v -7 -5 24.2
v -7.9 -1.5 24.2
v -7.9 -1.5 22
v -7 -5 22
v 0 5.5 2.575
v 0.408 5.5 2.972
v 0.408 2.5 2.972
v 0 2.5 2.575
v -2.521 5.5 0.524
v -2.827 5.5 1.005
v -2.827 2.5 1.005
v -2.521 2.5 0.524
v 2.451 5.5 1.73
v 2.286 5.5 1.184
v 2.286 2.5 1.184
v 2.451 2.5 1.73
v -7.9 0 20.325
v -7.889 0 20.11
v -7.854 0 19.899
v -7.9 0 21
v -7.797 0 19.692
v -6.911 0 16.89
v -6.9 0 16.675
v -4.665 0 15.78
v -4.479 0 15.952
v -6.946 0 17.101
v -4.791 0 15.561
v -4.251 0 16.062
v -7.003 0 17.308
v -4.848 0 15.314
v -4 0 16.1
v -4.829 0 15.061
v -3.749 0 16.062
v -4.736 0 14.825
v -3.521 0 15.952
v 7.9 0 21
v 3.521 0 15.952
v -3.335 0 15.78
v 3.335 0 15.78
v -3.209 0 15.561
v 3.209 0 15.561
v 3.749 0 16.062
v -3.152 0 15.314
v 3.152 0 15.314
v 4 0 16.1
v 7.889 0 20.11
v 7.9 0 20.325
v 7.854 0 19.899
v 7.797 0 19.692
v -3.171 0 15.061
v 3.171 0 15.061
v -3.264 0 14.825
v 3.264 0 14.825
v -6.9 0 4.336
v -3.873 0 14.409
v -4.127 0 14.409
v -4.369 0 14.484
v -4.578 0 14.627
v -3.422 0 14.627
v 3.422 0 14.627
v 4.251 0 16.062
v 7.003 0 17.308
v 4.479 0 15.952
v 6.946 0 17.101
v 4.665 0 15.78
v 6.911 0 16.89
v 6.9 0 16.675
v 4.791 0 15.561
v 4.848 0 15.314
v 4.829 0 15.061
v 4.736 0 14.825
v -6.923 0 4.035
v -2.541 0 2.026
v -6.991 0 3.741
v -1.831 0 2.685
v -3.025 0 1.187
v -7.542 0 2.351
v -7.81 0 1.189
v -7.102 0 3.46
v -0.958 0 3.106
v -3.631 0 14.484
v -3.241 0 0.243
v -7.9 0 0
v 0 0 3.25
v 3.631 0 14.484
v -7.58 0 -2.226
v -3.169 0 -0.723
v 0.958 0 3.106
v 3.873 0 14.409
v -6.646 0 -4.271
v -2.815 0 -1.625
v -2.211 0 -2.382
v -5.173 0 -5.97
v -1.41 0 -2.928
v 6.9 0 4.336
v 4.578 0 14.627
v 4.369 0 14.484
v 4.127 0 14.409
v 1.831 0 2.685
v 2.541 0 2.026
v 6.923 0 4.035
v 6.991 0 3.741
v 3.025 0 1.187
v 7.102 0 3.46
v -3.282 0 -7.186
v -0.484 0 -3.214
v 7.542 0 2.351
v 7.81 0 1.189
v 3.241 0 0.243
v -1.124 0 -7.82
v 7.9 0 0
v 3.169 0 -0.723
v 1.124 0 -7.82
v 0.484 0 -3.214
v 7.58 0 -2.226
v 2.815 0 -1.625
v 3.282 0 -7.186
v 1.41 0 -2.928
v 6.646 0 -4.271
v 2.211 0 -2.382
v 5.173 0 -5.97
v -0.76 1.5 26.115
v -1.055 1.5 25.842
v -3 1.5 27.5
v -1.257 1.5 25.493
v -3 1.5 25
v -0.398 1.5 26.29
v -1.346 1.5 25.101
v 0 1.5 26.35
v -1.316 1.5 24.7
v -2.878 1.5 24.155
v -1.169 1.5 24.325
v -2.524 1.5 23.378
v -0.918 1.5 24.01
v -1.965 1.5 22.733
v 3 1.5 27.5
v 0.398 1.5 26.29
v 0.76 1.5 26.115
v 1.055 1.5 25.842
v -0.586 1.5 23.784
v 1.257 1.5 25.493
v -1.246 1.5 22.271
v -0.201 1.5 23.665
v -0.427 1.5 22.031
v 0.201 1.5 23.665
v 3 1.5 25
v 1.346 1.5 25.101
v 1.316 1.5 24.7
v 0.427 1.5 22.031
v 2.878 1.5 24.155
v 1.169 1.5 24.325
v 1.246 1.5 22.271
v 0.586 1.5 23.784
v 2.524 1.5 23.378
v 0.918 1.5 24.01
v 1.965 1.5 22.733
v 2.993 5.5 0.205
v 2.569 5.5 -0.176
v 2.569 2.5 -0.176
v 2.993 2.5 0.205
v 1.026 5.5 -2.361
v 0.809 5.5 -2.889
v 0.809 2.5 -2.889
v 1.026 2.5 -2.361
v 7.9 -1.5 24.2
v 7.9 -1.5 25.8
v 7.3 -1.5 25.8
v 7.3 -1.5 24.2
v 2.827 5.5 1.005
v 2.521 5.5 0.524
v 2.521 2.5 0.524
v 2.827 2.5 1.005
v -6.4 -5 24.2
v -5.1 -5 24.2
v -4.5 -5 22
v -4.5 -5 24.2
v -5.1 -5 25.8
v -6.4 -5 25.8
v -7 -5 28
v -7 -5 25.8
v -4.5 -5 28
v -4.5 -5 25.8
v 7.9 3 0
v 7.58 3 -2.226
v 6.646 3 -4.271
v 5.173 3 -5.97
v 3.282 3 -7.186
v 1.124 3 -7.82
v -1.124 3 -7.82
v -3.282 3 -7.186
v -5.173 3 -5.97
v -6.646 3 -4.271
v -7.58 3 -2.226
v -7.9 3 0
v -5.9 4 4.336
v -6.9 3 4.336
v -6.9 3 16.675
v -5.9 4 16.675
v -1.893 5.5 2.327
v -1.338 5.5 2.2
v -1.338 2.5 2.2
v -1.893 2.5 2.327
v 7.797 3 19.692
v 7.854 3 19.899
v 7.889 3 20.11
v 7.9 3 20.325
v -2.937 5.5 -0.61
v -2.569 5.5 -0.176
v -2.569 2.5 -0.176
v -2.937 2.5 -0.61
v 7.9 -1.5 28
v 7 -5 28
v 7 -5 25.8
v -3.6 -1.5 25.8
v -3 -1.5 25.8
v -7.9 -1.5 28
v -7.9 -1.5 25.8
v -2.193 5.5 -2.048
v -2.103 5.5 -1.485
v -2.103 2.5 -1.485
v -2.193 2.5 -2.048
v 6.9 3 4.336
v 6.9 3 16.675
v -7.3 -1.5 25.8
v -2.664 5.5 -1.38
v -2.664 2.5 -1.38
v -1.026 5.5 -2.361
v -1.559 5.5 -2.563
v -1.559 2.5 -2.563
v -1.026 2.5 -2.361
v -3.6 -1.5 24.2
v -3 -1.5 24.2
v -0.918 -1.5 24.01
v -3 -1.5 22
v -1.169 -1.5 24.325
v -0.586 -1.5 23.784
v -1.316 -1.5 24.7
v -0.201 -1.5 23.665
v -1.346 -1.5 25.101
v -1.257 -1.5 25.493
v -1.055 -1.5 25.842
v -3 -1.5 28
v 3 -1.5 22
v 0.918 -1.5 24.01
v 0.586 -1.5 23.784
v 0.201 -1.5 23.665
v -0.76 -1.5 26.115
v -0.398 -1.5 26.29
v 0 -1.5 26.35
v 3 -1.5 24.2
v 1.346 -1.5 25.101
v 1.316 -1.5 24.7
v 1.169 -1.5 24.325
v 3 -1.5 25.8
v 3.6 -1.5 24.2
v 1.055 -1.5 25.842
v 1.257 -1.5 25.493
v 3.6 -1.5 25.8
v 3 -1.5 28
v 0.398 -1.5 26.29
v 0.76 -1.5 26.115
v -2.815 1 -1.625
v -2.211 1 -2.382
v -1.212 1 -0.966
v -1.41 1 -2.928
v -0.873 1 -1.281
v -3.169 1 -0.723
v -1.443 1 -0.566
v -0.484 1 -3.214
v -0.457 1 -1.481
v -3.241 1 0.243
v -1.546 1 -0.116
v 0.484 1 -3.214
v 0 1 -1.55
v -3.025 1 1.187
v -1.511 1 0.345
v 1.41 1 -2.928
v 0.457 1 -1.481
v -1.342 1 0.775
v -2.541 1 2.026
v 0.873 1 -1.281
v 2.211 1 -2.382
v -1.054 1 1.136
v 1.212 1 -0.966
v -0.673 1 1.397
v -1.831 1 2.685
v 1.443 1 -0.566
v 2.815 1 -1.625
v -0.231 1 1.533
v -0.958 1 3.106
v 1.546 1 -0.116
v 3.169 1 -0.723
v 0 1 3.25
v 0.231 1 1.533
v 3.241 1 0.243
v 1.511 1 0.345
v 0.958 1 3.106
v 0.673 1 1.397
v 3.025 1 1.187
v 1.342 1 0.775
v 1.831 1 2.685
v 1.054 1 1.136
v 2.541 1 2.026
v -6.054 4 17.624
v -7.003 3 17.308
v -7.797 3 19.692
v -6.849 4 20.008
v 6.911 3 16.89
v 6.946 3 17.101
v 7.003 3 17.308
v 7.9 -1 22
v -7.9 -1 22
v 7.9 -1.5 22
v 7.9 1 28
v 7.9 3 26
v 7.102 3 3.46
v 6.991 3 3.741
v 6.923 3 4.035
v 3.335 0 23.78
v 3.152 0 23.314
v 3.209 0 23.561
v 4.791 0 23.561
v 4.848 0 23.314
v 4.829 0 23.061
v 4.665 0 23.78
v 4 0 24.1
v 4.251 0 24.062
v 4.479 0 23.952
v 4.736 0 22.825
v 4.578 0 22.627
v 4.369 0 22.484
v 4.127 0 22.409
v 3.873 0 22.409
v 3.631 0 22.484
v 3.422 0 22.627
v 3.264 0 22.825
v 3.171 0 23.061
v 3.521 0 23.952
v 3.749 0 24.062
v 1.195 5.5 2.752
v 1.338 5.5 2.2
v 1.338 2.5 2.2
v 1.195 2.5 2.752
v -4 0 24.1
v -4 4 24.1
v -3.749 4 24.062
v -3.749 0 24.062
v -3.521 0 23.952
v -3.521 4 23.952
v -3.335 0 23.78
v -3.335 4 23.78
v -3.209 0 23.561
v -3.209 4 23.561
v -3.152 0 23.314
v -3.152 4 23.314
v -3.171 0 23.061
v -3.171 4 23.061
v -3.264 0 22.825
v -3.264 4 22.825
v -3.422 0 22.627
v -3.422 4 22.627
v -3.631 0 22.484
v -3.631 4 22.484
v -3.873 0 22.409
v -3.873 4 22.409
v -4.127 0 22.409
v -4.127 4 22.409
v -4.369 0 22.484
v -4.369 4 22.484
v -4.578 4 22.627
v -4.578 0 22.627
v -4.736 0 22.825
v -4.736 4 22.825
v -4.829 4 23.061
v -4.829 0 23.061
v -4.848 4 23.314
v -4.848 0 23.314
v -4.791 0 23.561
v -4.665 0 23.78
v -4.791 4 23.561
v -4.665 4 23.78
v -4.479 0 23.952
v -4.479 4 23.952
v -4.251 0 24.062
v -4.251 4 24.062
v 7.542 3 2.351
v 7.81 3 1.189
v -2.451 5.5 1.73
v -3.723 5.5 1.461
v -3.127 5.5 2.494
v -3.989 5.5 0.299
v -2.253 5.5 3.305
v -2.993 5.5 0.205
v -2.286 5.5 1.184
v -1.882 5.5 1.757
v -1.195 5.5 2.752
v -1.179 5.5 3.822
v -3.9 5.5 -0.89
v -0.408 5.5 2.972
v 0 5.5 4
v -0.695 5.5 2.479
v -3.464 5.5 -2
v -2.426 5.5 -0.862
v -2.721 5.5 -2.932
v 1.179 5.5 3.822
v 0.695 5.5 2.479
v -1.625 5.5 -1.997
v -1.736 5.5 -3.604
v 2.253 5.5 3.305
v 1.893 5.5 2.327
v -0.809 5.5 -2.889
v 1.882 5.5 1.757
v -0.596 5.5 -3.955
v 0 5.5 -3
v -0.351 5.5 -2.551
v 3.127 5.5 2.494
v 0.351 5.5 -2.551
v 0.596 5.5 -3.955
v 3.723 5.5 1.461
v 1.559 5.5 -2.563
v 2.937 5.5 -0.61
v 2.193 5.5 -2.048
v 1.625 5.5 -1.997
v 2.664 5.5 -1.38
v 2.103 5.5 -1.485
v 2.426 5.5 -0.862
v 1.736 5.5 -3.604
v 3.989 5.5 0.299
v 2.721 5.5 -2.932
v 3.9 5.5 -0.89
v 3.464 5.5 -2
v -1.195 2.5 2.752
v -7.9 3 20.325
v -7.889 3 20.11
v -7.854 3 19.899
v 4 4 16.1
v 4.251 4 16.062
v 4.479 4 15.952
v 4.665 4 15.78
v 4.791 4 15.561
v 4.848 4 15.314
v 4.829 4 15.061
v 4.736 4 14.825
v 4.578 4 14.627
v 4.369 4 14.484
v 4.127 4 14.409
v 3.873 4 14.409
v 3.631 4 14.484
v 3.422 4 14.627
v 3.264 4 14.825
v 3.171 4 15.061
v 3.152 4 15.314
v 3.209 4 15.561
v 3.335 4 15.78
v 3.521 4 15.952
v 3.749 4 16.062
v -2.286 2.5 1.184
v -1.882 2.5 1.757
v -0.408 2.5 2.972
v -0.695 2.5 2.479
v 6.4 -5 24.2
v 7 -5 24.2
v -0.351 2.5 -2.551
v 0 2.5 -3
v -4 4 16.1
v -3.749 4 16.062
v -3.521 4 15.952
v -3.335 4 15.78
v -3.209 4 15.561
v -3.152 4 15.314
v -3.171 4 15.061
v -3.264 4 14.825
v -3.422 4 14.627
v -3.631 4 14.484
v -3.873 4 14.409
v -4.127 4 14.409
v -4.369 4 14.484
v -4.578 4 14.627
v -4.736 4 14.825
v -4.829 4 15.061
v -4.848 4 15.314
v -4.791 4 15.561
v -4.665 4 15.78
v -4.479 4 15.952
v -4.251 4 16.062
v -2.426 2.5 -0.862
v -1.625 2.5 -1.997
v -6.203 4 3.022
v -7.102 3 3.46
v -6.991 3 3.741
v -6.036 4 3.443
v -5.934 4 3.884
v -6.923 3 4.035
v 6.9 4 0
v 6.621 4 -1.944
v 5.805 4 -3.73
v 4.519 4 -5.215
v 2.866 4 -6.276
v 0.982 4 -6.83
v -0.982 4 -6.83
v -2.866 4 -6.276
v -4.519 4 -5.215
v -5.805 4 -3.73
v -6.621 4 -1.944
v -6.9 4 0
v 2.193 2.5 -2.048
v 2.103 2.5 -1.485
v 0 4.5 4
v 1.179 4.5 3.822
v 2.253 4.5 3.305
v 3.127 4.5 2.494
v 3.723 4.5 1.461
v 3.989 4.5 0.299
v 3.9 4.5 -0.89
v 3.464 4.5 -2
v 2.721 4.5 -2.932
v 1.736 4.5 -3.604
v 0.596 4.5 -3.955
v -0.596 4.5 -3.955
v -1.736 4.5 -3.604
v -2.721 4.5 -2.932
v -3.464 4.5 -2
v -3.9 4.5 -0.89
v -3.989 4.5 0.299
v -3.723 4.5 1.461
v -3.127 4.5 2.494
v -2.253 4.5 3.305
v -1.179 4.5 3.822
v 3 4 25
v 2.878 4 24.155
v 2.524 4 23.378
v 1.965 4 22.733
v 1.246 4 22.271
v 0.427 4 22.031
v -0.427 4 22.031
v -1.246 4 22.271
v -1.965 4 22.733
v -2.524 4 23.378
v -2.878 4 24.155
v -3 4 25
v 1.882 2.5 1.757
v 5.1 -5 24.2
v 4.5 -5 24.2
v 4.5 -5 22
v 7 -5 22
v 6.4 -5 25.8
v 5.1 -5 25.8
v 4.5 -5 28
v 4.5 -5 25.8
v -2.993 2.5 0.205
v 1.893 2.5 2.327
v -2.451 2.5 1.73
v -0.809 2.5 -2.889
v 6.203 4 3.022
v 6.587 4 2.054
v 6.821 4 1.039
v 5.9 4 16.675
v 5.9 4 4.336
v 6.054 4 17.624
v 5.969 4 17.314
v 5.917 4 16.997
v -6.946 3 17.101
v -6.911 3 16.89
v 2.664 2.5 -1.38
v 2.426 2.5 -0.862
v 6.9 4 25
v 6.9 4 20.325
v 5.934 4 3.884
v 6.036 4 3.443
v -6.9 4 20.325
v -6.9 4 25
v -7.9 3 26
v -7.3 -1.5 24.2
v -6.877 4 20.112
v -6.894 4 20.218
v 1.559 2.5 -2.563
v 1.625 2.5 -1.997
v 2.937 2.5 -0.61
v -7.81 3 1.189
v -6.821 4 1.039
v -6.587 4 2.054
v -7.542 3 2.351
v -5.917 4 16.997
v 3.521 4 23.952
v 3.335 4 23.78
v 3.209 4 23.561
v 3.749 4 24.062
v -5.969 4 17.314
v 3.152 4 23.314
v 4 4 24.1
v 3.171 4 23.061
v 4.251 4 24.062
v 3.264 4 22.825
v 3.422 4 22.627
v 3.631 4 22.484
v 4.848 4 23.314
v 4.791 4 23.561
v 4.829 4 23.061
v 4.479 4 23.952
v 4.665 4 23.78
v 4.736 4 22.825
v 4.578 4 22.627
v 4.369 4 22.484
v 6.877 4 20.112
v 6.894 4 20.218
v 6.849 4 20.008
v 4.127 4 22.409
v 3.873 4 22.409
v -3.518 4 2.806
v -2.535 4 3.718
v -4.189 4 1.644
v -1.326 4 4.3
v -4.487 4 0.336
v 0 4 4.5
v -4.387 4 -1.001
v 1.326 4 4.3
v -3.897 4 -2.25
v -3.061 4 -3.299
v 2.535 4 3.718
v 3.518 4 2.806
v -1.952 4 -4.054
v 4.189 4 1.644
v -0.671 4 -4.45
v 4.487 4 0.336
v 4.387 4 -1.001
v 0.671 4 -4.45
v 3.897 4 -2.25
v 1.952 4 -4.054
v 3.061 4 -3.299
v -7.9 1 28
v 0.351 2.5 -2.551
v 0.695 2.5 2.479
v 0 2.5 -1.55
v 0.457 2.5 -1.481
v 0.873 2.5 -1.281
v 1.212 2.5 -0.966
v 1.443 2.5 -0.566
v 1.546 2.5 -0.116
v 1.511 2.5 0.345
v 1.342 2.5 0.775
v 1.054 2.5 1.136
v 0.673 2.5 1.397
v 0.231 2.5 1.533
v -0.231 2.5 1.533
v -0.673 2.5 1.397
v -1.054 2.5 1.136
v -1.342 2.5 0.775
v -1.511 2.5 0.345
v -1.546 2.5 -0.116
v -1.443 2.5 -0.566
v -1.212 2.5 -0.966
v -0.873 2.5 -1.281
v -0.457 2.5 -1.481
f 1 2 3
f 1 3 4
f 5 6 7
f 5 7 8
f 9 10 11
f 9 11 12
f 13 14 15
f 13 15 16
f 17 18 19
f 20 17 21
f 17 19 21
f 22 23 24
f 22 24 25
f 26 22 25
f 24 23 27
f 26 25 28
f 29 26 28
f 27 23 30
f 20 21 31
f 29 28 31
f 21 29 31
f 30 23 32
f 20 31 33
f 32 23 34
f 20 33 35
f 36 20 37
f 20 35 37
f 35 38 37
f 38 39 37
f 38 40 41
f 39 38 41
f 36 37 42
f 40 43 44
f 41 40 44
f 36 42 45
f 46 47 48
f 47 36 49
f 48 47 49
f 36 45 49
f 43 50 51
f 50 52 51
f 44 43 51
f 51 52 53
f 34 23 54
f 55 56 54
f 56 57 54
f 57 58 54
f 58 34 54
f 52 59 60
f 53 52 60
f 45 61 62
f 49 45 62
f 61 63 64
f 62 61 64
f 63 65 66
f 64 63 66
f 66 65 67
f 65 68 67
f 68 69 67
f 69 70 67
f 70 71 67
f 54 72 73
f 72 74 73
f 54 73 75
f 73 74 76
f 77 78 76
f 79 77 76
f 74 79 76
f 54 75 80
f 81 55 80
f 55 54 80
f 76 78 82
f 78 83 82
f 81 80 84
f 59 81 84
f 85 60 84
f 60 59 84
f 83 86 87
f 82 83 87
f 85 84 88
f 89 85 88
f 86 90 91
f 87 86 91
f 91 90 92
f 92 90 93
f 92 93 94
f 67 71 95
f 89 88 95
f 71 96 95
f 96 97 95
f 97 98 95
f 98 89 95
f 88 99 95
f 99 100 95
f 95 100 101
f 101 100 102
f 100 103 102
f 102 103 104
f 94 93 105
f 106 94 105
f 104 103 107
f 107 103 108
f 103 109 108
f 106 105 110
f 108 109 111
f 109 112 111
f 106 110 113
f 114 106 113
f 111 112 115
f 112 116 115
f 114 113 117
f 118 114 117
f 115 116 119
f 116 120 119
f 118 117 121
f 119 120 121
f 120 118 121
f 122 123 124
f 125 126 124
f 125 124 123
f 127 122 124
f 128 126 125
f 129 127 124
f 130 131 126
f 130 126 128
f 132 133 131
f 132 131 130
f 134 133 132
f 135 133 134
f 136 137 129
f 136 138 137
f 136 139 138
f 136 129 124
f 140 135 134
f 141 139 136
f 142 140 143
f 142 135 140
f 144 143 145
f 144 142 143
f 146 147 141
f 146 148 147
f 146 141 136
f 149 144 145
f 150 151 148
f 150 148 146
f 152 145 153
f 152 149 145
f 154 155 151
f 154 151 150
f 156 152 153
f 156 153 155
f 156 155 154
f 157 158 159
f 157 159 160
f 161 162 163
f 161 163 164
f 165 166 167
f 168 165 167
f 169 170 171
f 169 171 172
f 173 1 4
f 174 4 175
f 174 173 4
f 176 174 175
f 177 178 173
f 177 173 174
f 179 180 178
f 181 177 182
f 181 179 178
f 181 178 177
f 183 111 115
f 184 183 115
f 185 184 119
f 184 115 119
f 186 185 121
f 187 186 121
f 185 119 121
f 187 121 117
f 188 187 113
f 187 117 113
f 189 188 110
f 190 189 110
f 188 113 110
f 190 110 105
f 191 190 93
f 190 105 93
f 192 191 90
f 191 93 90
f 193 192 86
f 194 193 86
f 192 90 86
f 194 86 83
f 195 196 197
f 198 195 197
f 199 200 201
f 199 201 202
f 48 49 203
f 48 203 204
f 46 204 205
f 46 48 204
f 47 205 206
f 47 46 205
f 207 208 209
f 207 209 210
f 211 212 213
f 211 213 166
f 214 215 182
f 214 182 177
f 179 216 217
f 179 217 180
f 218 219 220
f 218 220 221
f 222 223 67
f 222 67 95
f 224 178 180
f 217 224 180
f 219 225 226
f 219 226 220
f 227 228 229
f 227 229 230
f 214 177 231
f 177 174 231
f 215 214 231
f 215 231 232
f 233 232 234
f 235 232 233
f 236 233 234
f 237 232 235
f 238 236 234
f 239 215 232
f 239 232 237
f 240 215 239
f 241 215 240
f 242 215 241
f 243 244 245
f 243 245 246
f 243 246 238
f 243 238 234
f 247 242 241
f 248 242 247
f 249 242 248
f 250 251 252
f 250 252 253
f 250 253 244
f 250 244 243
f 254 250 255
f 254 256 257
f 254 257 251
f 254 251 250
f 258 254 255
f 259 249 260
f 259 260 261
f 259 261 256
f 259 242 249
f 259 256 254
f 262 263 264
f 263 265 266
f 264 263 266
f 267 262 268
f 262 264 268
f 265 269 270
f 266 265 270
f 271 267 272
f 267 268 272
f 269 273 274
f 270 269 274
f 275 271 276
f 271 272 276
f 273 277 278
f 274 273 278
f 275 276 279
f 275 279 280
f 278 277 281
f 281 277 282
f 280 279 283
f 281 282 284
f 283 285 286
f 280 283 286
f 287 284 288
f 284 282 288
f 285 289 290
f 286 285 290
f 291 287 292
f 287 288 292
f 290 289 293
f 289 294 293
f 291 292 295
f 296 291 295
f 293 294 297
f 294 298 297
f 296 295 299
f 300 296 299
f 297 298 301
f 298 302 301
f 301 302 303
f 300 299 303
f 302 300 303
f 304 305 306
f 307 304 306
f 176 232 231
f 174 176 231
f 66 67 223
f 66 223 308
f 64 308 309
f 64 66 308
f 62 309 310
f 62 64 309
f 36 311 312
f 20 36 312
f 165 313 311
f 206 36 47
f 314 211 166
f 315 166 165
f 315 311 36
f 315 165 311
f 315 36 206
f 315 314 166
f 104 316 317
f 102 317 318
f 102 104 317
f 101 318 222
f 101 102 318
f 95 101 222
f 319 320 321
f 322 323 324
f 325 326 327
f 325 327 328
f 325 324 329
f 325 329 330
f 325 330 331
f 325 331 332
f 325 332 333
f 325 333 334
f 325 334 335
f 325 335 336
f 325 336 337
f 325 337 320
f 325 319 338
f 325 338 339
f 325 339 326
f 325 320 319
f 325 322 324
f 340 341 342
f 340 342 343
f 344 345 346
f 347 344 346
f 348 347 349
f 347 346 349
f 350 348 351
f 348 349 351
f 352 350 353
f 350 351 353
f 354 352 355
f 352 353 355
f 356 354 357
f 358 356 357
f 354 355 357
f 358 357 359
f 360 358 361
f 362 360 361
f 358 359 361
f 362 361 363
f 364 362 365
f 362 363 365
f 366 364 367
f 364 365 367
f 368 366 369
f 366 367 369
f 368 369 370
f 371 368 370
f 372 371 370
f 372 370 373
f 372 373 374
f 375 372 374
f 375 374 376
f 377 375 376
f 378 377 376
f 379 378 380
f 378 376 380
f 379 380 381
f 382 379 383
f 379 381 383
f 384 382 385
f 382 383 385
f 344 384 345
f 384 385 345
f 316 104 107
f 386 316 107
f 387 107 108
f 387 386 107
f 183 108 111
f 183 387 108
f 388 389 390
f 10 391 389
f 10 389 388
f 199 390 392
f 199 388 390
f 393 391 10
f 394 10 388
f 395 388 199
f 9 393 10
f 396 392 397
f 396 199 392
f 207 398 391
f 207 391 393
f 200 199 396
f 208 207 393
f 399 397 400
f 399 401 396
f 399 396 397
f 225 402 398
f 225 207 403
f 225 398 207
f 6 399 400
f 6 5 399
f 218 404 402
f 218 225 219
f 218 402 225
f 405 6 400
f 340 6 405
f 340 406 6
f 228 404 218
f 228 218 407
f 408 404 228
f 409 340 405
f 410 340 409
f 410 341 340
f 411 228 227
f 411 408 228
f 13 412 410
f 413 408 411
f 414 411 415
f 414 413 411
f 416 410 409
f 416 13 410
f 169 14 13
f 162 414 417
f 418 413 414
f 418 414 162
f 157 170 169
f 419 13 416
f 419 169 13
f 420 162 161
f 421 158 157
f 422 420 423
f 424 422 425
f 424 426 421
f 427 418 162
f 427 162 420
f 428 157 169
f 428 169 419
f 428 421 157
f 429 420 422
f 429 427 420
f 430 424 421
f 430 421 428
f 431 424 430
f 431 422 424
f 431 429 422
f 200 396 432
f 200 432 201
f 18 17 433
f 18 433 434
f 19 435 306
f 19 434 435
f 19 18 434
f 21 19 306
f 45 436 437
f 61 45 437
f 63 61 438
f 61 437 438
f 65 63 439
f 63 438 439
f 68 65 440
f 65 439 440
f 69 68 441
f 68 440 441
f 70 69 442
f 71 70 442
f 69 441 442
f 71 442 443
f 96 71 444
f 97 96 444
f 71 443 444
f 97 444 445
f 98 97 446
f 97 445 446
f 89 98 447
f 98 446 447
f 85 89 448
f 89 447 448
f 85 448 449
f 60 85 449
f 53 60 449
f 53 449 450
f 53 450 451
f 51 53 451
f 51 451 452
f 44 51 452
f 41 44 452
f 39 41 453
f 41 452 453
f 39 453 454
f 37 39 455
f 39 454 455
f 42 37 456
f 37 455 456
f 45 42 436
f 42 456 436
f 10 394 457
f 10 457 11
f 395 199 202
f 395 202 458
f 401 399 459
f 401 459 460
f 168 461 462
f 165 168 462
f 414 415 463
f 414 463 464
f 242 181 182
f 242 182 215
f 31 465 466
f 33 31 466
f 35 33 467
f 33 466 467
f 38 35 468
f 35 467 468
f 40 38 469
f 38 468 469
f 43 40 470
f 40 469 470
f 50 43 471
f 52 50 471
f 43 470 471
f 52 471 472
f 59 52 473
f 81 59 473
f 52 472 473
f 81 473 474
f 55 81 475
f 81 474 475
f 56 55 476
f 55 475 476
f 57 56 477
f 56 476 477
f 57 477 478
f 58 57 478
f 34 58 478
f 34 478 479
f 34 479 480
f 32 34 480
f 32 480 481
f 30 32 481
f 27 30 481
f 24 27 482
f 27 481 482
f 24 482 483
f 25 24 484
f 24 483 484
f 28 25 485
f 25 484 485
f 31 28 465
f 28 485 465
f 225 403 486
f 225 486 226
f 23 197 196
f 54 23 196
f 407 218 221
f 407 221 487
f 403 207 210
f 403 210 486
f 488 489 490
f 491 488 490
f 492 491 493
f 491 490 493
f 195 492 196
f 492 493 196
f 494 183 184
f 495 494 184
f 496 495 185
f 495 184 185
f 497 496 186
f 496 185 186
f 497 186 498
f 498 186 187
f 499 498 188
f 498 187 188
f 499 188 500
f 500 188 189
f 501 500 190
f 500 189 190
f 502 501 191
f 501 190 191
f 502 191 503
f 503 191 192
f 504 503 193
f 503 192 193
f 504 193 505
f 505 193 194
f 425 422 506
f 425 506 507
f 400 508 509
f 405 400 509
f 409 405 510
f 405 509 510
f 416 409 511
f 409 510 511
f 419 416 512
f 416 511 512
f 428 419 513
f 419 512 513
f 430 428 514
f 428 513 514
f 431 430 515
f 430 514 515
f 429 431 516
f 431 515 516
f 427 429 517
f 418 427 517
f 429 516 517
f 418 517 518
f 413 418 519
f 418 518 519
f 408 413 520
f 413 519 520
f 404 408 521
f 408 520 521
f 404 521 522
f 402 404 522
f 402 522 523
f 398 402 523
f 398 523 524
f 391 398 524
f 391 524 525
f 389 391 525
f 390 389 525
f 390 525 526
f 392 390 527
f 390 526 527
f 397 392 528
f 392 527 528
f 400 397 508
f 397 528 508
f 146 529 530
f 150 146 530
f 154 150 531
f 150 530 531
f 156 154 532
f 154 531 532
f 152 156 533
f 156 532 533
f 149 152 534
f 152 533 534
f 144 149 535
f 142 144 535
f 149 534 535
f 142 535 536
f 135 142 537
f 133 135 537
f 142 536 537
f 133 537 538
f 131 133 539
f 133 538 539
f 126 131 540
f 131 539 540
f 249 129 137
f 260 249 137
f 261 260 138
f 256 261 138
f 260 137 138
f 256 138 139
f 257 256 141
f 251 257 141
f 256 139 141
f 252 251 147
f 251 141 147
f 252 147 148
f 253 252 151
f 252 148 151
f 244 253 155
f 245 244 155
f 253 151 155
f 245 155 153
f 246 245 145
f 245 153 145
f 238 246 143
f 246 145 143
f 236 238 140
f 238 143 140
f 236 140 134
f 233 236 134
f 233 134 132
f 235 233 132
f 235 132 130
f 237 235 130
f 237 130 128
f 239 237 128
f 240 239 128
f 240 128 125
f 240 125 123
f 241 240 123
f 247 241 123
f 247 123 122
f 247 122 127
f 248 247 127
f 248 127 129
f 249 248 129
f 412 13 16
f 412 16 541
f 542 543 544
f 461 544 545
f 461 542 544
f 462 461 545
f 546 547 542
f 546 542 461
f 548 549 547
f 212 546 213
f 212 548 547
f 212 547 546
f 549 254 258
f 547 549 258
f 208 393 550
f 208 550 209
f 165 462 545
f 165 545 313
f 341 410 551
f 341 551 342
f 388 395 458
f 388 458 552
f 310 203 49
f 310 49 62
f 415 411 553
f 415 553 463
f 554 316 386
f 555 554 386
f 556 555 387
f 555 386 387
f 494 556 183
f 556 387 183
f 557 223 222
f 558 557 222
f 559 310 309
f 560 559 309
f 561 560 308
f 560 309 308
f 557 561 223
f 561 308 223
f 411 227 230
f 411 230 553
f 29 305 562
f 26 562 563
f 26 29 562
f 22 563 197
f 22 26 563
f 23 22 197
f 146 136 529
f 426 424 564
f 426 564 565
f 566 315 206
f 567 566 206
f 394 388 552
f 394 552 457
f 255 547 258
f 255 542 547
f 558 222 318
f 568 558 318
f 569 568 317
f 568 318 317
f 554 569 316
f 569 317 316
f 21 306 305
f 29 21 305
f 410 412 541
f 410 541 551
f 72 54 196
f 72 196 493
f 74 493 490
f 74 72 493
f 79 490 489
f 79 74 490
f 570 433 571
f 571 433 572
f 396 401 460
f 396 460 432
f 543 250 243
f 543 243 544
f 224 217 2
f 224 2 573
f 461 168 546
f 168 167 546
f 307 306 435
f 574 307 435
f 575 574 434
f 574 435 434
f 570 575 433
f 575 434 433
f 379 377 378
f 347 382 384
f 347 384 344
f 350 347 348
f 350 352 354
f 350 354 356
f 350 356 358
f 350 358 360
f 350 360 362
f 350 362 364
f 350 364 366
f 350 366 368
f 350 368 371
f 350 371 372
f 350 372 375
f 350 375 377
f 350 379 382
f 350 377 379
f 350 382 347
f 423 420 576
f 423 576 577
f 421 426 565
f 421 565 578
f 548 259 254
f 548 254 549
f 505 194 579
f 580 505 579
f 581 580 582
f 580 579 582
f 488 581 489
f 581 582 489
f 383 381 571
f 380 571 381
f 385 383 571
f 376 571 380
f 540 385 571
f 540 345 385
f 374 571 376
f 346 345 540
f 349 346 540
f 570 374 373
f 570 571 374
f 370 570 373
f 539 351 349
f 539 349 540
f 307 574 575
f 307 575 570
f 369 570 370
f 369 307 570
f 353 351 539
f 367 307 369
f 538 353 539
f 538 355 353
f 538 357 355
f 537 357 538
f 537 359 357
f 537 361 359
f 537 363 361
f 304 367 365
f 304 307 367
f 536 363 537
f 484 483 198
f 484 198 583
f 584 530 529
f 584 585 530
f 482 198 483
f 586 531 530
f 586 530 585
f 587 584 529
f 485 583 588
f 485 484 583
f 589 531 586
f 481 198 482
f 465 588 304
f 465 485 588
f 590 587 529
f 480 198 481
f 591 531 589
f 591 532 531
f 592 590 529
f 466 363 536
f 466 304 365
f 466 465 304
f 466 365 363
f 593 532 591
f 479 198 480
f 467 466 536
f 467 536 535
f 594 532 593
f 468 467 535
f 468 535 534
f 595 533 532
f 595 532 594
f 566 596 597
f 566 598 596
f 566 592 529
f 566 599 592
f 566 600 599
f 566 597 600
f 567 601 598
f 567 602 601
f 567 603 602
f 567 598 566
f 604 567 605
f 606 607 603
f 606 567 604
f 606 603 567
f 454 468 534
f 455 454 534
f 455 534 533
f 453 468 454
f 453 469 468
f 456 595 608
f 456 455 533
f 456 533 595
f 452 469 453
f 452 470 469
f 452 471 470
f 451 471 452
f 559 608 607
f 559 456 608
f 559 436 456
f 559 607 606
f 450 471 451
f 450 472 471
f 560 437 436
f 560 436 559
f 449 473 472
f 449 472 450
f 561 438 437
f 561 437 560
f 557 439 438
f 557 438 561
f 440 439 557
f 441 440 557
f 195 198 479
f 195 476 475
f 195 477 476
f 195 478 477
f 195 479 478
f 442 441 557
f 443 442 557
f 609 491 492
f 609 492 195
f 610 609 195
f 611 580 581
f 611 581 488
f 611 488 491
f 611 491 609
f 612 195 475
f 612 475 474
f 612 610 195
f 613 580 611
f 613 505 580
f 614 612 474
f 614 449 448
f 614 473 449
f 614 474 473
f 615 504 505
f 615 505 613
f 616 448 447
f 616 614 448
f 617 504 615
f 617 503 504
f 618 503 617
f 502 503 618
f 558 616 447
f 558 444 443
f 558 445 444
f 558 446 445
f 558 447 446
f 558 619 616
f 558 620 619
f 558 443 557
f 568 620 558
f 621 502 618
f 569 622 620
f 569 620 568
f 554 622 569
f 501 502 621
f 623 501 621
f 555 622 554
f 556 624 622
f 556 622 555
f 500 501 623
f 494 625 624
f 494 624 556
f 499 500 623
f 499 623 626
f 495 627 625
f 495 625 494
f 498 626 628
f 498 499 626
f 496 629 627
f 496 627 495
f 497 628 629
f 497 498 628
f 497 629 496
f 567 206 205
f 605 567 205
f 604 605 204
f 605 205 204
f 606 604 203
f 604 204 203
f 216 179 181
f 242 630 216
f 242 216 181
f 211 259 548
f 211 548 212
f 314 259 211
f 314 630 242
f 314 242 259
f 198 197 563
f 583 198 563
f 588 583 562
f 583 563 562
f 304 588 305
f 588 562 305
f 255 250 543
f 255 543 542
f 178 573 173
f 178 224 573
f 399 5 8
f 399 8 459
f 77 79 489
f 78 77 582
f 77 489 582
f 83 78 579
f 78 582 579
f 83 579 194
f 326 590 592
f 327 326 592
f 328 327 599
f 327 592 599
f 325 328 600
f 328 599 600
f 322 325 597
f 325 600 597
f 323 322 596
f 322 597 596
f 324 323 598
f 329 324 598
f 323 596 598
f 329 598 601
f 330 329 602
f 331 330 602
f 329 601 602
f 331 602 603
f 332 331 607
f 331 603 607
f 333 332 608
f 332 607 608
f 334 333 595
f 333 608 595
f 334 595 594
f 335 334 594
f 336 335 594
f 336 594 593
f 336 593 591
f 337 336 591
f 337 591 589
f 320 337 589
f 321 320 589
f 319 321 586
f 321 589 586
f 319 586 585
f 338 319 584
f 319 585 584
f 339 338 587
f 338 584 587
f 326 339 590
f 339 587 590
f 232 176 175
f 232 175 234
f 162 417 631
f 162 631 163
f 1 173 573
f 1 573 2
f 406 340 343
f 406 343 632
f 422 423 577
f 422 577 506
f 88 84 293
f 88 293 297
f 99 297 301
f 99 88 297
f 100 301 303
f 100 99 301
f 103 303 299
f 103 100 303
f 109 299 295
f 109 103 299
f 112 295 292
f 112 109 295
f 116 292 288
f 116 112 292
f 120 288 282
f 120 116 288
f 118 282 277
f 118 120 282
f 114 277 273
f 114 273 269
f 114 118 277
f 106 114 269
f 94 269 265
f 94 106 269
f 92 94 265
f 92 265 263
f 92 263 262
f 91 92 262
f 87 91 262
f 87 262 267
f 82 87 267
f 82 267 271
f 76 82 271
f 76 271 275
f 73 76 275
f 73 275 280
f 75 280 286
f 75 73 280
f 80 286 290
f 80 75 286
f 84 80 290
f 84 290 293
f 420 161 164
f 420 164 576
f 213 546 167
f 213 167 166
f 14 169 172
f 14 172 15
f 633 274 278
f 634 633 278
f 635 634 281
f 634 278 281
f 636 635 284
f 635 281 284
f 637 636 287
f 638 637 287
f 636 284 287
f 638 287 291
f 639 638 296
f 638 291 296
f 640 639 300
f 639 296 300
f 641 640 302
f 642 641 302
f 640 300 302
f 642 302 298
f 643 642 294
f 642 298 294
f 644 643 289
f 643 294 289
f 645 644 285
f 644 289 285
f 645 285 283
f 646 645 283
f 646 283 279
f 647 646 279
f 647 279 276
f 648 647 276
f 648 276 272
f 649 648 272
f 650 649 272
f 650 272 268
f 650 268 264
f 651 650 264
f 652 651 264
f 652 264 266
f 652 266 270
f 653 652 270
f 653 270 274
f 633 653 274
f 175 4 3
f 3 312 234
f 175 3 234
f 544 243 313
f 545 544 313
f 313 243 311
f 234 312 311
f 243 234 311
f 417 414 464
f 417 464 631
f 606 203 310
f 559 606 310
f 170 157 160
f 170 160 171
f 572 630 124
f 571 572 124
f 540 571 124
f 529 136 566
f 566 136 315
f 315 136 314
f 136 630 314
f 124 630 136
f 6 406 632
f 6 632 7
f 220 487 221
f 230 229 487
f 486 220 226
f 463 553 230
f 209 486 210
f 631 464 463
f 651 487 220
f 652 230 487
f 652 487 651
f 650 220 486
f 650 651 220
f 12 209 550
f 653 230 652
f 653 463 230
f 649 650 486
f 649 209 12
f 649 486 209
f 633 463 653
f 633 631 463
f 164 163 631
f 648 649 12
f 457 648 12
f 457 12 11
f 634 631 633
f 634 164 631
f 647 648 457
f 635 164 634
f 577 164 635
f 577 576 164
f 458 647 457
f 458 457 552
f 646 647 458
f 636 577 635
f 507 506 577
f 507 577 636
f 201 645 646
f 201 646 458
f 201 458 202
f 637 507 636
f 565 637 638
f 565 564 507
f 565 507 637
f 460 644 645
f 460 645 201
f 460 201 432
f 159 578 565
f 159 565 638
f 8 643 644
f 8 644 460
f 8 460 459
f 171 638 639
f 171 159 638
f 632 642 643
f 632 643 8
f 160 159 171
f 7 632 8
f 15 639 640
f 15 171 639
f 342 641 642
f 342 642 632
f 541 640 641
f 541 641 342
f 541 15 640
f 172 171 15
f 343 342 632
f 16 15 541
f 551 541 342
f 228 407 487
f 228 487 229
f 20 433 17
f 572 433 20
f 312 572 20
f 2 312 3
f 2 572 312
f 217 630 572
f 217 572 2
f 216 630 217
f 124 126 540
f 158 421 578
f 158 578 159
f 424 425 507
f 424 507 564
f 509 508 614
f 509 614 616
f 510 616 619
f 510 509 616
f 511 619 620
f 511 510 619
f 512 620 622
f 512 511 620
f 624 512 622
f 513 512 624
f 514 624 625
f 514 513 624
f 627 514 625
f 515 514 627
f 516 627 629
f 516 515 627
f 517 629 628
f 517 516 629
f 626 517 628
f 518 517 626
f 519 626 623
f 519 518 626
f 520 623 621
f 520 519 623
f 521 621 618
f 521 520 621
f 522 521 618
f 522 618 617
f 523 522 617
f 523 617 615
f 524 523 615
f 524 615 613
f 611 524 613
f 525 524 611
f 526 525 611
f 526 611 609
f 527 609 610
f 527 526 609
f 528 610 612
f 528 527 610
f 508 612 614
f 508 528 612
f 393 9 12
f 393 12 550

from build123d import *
from build123d.topology import SkipClean

# Parameters (mm, degrees)
EXTRUDE_1_DEPTH          = 4
EXTRUDE_3_DEPTH          = 6
CHAMFER_1_SIZE           = 3
SKETCH_5_R               = 0.85
CUT_EXTRUDE_1_DEPTH      = 4
PATTERN_LINEAR_1_COUNT   = 2
PATTERN_LINEAR_1_PITCH   = 8
CUT_EXTRUDE_2_DEPTH      = 2.5
CUT_EXTRUDE_3_REACH      = 31.81
SKETCH_7_R               = 1.35
SKETCH_9_R               = 3.25
CUT_EXTRUDE_4_DEPTH      = 1
SKETCH_10_R              = 4
EXTRUDE_4_DEPTH          = 1.5
CHAMFER_3_SIZE           = 0.5
SKETCH_11_R              = 3
CUT_EXTRUDE_5_DEPTH      = 3
SKETCH_12_R              = 1.55
CUT_EXTRUDE_6_DEPTH      = 30.705386717
EXTRUDE_5_DEPTH          = 3
PATTERN_CIRCULAR_1_COUNT = 23
CUT_EXTRUDE_7_DEPTH      = 0.8
CUT_EXTRUDE_8_DEPTH      = 31.453407034
FILLET_1_R               = 2
CHAMFER_2_SIZE           = 1


with BuildPart() as part:
    # ｽｹｯﾁ1 → ﾎﾞｽ - 押し出し1 (new body)
    with BuildSketch(Plane(origin=(0, 0, 0), x_dir=(1, 0, 0), z_dir=(0, 1, 0))):
        with BuildLine():
            Line((-7.9, 0), (-7.9, -28))
            Line((-7.9, -28), (7.9, -28))
            Line((7.9, -28), (7.9, 0))
            ThreePointArc((7.9, 0), (0, 7.9), (-7.9, 0))
        make_face()
    extrude(amount=EXTRUDE_1_DEPTH)

    # ｽｹｯﾁ4 → ﾎﾞｽ - 押し出し3 (add)
    with BuildSketch(Plane.XY.offset(28)):
        Polygon((-7, -5), (-4.5, -5), (-3, -1.5), (3, -1.5), (4.5, -5), (7, -5), (7.9, -1.5), (7.9, 0), (-7.9, 0), (-7.9, -1.5), align=None)
    extrude(amount=-EXTRUDE_3_DEPTH)

    # 面取り1
    chamfer_1_edges = [part.edges().sort_by_distance(p)[0] for p in [
        (0, 4, 28),
    ]]
    chamfer(chamfer_1_edges, length=CHAMFER_1_SIZE)

    # ｽｹｯﾁ5 → ｶｯﾄ - 押し出し1 (cut)
    with BuildSketch(Plane(origin=(0, 4, 0), x_dir=(1, 0, 0), z_dir=(0, 1, 0))):
        with Locations(Location((-4, -23.25, 0), (0, 0, 270))):
            Circle(SKETCH_5_R)
        with Locations(Location((4, -23.25, 0), (0, 0, 270))):
            Circle(SKETCH_5_R)
    cut_extrude_1 = extrude(amount=-CUT_EXTRUDE_1_DEPTH, mode=Mode.SUBTRACT)

    # 直線ﾊﾟﾀｰﾝ1: ｶｯﾄ - 押し出し1 ×2
    with Locations(*[(0, 0, -i * PATTERN_LINEAR_1_PITCH) for i in range(1, PATTERN_LINEAR_1_COUNT)]):
        add(cut_extrude_1, mode=Mode.SUBTRACT)

    # ｽｹｯﾁ6 → ｶｯﾄ - 押し出し2 (cut)
    with BuildSketch(Plane(origin=(0, 4, 0), x_dir=(1, 0, 0), z_dir=(0, 1, 0))):
        with BuildLine():
            Line((-3, -25), (-3, -29))
            Line((-3, -29), (3, -29))
            Line((3, -29), (3, -25))
            ThreePointArc((3, -25), (0, -22), (-3, -25))
        make_face()
    extrude(amount=-CUT_EXTRUDE_2_DEPTH, mode=Mode.SUBTRACT)

    # ｽｹｯﾁ7 → ｶｯﾄ - 押し出し3 (cut, up to next)
    with BuildSketch(Plane(origin=(0, 1.5, 0), x_dir=(1, 0, 0), z_dir=(0, 1, 0)), mode=Mode.PRIVATE) as cut_extrude_3_sk1:
        with Locations(Location((0, -25, 0), (0, 0, 270))):
            Circle(SKETCH_7_R)
    cut_extrude_3_tool1 = extrude(cut_extrude_3_sk1.sketch, amount=-CUT_EXTRUDE_3_REACH, mode=Mode.PRIVATE) & part.part
    add(cut_extrude_3_tool1.solids().sort_by_distance((0, 1.5, 25))[0], mode=Mode.SUBTRACT)

    # ｽｹｯﾁ9 → ｶｯﾄ - 押し出し4 (cut)
    with BuildSketch(Plane(origin=(0, 0, 0), x_dir=(1, 0, 0), z_dir=(0, 1, 0))):
        with Locations(Location((0, 0, 0), (0, 0, 270))):
            Circle(SKETCH_9_R)
    extrude(amount=CUT_EXTRUDE_4_DEPTH, mode=Mode.SUBTRACT)

    # ｽｹｯﾁ10 → ﾎﾞｽ - 押し出し4 (add)
    with BuildSketch(Plane(origin=(0, 4, 0), x_dir=(1, 0, 0), z_dir=(0, 1, 0))):
        with Locations(Location((0, 0, 0), (0, 0, 270))):
            Circle(SKETCH_10_R)
    extrude(amount=EXTRUDE_4_DEPTH)

    # 面取り3
    chamfer_3_edges = [part.edges().sort_by_distance(p)[0] for p in [
        (0, 4, -4),
    ]]
    chamfer(chamfer_3_edges, length=CHAMFER_3_SIZE)

    # ｽｹｯﾁ11 → ｶｯﾄ - 押し出し5 (cut)
    with BuildSketch(Plane(origin=(0, 5.5, 0), x_dir=(1, 0, 0), z_dir=(0, 1, 0))):
        with Locations(Location((0, 0, 0), (0, 0, 270))):
            Circle(SKETCH_11_R)
    extrude(amount=-CUT_EXTRUDE_5_DEPTH, mode=Mode.SUBTRACT)

    # ｽｹｯﾁ12 → ｶｯﾄ - 押し出し6 (cut, through all)
    with BuildSketch(Plane.XZ.offset(-1)):
        with Locations(Location((0, 0, 0), (0, 0, 270))):
            Circle(SKETCH_12_R)
    extrude(amount=-CUT_EXTRUDE_6_DEPTH, mode=Mode.SUBTRACT)

    # ｽｹｯﾁ13 → ﾎﾞｽ - 押し出し5 (add)
    with BuildSketch(Plane(origin=(0, 5.5, 0), x_dir=(1, 0, 0), z_dir=(0, 1, 0))):
        with BuildLine():
            Line((0.408499947, -2.972057838), (0, -2.574530741))
            Line((0, -2.574530741), (-0.408499947, -2.972057838))
            ThreePointArc((-0.408499947, -2.972057838), (0, -3), (0.408499947, -2.972057838))
        make_face()
    extrude_5 = extrude(amount=-EXTRUDE_5_DEPTH)

    # 円形ﾊﾟﾀｰﾝ1: ﾎﾞｽ - 押し出し5 ×23 about axis
    pattern_circular_1_axis = Axis((0, 0, 0), (0, 1, 0))
    for i in range(1, PATTERN_CIRCULAR_1_COUNT):
        add(extrude_5.rotate(pattern_circular_1_axis, i * 360 / PATTERN_CIRCULAR_1_COUNT))

    # ｽｹｯﾁ14 → ｶｯﾄ - 押し出し7 (cut, symmetric)
    with BuildSketch(Plane.XY.offset(25)):
        Polygon((3, -1.5), (4.5, -5), (5.1, -5), (3.6, -1.5), align=None)
        Polygon((6.4, -5), (7, -5), (7.9, -1.5), (7.3, -1.5), align=None)
    cut_extrude_7 = extrude(amount=CUT_EXTRUDE_7_DEPTH, both=True, mode=Mode.SUBTRACT)

    # ﾐﾗｰ1: ｶｯﾄ - 押し出し7 across plane
    add(cut_extrude_7.mirror(Plane(origin=(0, 0, 0), x_dir=(0, 0, 1), z_dir=(1, 0, 0))), mode=Mode.SUBTRACT)

    # ｽｹｯﾁ15 → ｶｯﾄ - 押し出し8 (cut, through all)
    with SkipClean():  # the faces are left unmerged after this step: merging them gives an invalid solid
        with BuildSketch(Plane(origin=(0, 4, 0), x_dir=(1, 0, 0), z_dir=(0, 1, 0))):
            with BuildLine():
                Line((-7.9, 0), (-7.9, -20))
                Line((-7.9, -20), (-6.9, -17))
                Line((-6.9, -17), (-6.9, -3.847076812))
                ThreePointArc((-6.9, -3.847076812), (-7.645913941, -1.987460691), (-7.9, 0))
            make_face()
        cut_extrude_8 = extrude(amount=-CUT_EXTRUDE_8_DEPTH, mode=Mode.SUBTRACT)

    # ﾐﾗｰ2: ｶｯﾄ - 押し出し8 across plane
    with SkipClean():  # the faces are left unmerged after this step: merging them gives an invalid solid
        add(cut_extrude_8.mirror(Plane(origin=(0, 0, 0), x_dir=(0, 0, 1), z_dir=(1, 0, 0))), mode=Mode.SUBTRACT)

    # ﾌｨﾚｯﾄ1
    fillet_1_edges = [part.edges().sort_by_distance(p)[0] for p in [
        (-6.9, 2, 3.847076812),
        (-6.9, 2, 17),
        (-7.9, 2, 20),
        (6.9, 2, 3.847076812),
        (7.9, 2, 20),
        (6.9, 2, 17),
    ]]
    fillet(fillet_1_edges, radius=FILLET_1_R)

    # 面取り2
    chamfer_2_edges = [part.edges().sort_by_distance(p)[0] for p in [
        (-7.9, 4, 22.66227766),
        (0, 4, -7.9),
        (7.9, 4, 22.66227766),
        (0, 0, 22),
        (-7.874174915, 4, 20.004190834),
        (-7.4, 4, 18.5),
        (-6.925825085, 4, 16.995809166),
        (-6.9, 4, 10.505670679),
        (-6.951159371, 4, 3.886430103),
        (6.951159371, 4, 3.886430103),
        (6.9, 4, 10.505670679),
        (6.925825085, 4, 16.995809166),
        (7.4, 4, 18.5),
        (7.874174915, 4, 20.004190834),
    ]]
    chamfer(chamfer_2_edges, length=CHAMFER_2_SIZE)


solid = part.part
